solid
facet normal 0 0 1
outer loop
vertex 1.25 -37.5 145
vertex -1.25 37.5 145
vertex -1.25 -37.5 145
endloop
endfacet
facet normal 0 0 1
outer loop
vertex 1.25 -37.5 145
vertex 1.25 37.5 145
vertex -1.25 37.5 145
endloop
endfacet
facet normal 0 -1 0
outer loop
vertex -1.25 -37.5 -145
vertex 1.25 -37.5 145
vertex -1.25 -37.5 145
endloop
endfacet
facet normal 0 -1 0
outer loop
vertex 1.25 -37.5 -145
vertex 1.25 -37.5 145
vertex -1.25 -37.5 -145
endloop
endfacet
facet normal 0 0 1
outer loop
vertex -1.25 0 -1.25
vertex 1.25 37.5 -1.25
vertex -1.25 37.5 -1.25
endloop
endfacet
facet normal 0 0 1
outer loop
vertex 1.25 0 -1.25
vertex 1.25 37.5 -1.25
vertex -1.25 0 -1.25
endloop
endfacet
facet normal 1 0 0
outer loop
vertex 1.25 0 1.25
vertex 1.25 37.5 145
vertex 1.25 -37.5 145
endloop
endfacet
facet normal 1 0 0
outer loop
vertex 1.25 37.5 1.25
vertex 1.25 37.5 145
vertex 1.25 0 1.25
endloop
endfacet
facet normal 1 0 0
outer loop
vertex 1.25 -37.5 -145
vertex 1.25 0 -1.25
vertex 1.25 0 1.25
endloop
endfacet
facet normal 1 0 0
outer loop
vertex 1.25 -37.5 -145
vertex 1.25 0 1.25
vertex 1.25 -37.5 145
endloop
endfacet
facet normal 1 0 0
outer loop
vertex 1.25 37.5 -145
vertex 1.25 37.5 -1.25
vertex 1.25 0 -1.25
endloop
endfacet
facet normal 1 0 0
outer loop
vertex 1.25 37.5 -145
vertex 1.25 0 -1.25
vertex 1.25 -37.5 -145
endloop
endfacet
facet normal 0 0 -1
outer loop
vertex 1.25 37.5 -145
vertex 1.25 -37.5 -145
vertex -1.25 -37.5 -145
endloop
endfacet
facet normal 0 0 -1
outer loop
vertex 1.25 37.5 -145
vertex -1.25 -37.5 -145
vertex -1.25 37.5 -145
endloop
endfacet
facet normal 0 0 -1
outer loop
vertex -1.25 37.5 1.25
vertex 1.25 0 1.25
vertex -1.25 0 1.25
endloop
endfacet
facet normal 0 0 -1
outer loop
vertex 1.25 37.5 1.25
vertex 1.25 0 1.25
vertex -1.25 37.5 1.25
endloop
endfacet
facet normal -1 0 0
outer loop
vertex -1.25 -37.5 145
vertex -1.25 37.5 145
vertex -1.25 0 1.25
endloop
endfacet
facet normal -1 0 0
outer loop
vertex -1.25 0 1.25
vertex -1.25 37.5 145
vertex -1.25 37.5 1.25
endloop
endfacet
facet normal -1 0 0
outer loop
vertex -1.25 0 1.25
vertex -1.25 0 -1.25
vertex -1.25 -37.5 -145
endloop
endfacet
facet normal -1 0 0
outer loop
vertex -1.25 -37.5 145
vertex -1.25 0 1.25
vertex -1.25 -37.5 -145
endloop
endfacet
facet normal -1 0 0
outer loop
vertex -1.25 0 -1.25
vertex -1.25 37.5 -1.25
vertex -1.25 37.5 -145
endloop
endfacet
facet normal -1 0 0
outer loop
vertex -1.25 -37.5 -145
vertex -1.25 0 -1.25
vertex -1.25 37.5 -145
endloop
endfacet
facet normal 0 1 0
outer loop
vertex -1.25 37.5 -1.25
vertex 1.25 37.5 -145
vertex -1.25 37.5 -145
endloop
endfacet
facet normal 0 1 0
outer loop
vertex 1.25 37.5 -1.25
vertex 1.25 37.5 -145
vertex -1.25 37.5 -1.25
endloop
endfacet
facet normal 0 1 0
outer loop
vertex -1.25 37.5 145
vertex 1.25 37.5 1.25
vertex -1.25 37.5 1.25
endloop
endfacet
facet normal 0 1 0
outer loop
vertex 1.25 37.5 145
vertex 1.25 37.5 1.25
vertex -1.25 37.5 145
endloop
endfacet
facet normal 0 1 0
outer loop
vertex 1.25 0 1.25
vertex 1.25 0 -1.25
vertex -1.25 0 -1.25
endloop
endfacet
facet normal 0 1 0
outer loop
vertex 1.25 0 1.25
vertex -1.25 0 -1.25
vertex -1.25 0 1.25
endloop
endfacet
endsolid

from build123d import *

# Parameters (mm, degrees)
BOSS_EXTRUDE1_DEPTH = 1.25


with BuildPart() as part:
    # Sketch1 → Boss-Extrude1 (new, symmetric)
    with BuildSketch(Plane(origin=(0, 0, 0), x_dir=(0, 0, -1), z_dir=(1, 0, 0))):
        Polygon((-145, -37.5), (145, -37.5), (145, 37.5), (1.25, 37.5), (1.25, 0), (-1.25, 0), (-1.25, 37.5), (-145, 37.5), align=None)
    extrude(amount=BOSS_EXTRUDE1_DEPTH, both=True)


solid = part.part
